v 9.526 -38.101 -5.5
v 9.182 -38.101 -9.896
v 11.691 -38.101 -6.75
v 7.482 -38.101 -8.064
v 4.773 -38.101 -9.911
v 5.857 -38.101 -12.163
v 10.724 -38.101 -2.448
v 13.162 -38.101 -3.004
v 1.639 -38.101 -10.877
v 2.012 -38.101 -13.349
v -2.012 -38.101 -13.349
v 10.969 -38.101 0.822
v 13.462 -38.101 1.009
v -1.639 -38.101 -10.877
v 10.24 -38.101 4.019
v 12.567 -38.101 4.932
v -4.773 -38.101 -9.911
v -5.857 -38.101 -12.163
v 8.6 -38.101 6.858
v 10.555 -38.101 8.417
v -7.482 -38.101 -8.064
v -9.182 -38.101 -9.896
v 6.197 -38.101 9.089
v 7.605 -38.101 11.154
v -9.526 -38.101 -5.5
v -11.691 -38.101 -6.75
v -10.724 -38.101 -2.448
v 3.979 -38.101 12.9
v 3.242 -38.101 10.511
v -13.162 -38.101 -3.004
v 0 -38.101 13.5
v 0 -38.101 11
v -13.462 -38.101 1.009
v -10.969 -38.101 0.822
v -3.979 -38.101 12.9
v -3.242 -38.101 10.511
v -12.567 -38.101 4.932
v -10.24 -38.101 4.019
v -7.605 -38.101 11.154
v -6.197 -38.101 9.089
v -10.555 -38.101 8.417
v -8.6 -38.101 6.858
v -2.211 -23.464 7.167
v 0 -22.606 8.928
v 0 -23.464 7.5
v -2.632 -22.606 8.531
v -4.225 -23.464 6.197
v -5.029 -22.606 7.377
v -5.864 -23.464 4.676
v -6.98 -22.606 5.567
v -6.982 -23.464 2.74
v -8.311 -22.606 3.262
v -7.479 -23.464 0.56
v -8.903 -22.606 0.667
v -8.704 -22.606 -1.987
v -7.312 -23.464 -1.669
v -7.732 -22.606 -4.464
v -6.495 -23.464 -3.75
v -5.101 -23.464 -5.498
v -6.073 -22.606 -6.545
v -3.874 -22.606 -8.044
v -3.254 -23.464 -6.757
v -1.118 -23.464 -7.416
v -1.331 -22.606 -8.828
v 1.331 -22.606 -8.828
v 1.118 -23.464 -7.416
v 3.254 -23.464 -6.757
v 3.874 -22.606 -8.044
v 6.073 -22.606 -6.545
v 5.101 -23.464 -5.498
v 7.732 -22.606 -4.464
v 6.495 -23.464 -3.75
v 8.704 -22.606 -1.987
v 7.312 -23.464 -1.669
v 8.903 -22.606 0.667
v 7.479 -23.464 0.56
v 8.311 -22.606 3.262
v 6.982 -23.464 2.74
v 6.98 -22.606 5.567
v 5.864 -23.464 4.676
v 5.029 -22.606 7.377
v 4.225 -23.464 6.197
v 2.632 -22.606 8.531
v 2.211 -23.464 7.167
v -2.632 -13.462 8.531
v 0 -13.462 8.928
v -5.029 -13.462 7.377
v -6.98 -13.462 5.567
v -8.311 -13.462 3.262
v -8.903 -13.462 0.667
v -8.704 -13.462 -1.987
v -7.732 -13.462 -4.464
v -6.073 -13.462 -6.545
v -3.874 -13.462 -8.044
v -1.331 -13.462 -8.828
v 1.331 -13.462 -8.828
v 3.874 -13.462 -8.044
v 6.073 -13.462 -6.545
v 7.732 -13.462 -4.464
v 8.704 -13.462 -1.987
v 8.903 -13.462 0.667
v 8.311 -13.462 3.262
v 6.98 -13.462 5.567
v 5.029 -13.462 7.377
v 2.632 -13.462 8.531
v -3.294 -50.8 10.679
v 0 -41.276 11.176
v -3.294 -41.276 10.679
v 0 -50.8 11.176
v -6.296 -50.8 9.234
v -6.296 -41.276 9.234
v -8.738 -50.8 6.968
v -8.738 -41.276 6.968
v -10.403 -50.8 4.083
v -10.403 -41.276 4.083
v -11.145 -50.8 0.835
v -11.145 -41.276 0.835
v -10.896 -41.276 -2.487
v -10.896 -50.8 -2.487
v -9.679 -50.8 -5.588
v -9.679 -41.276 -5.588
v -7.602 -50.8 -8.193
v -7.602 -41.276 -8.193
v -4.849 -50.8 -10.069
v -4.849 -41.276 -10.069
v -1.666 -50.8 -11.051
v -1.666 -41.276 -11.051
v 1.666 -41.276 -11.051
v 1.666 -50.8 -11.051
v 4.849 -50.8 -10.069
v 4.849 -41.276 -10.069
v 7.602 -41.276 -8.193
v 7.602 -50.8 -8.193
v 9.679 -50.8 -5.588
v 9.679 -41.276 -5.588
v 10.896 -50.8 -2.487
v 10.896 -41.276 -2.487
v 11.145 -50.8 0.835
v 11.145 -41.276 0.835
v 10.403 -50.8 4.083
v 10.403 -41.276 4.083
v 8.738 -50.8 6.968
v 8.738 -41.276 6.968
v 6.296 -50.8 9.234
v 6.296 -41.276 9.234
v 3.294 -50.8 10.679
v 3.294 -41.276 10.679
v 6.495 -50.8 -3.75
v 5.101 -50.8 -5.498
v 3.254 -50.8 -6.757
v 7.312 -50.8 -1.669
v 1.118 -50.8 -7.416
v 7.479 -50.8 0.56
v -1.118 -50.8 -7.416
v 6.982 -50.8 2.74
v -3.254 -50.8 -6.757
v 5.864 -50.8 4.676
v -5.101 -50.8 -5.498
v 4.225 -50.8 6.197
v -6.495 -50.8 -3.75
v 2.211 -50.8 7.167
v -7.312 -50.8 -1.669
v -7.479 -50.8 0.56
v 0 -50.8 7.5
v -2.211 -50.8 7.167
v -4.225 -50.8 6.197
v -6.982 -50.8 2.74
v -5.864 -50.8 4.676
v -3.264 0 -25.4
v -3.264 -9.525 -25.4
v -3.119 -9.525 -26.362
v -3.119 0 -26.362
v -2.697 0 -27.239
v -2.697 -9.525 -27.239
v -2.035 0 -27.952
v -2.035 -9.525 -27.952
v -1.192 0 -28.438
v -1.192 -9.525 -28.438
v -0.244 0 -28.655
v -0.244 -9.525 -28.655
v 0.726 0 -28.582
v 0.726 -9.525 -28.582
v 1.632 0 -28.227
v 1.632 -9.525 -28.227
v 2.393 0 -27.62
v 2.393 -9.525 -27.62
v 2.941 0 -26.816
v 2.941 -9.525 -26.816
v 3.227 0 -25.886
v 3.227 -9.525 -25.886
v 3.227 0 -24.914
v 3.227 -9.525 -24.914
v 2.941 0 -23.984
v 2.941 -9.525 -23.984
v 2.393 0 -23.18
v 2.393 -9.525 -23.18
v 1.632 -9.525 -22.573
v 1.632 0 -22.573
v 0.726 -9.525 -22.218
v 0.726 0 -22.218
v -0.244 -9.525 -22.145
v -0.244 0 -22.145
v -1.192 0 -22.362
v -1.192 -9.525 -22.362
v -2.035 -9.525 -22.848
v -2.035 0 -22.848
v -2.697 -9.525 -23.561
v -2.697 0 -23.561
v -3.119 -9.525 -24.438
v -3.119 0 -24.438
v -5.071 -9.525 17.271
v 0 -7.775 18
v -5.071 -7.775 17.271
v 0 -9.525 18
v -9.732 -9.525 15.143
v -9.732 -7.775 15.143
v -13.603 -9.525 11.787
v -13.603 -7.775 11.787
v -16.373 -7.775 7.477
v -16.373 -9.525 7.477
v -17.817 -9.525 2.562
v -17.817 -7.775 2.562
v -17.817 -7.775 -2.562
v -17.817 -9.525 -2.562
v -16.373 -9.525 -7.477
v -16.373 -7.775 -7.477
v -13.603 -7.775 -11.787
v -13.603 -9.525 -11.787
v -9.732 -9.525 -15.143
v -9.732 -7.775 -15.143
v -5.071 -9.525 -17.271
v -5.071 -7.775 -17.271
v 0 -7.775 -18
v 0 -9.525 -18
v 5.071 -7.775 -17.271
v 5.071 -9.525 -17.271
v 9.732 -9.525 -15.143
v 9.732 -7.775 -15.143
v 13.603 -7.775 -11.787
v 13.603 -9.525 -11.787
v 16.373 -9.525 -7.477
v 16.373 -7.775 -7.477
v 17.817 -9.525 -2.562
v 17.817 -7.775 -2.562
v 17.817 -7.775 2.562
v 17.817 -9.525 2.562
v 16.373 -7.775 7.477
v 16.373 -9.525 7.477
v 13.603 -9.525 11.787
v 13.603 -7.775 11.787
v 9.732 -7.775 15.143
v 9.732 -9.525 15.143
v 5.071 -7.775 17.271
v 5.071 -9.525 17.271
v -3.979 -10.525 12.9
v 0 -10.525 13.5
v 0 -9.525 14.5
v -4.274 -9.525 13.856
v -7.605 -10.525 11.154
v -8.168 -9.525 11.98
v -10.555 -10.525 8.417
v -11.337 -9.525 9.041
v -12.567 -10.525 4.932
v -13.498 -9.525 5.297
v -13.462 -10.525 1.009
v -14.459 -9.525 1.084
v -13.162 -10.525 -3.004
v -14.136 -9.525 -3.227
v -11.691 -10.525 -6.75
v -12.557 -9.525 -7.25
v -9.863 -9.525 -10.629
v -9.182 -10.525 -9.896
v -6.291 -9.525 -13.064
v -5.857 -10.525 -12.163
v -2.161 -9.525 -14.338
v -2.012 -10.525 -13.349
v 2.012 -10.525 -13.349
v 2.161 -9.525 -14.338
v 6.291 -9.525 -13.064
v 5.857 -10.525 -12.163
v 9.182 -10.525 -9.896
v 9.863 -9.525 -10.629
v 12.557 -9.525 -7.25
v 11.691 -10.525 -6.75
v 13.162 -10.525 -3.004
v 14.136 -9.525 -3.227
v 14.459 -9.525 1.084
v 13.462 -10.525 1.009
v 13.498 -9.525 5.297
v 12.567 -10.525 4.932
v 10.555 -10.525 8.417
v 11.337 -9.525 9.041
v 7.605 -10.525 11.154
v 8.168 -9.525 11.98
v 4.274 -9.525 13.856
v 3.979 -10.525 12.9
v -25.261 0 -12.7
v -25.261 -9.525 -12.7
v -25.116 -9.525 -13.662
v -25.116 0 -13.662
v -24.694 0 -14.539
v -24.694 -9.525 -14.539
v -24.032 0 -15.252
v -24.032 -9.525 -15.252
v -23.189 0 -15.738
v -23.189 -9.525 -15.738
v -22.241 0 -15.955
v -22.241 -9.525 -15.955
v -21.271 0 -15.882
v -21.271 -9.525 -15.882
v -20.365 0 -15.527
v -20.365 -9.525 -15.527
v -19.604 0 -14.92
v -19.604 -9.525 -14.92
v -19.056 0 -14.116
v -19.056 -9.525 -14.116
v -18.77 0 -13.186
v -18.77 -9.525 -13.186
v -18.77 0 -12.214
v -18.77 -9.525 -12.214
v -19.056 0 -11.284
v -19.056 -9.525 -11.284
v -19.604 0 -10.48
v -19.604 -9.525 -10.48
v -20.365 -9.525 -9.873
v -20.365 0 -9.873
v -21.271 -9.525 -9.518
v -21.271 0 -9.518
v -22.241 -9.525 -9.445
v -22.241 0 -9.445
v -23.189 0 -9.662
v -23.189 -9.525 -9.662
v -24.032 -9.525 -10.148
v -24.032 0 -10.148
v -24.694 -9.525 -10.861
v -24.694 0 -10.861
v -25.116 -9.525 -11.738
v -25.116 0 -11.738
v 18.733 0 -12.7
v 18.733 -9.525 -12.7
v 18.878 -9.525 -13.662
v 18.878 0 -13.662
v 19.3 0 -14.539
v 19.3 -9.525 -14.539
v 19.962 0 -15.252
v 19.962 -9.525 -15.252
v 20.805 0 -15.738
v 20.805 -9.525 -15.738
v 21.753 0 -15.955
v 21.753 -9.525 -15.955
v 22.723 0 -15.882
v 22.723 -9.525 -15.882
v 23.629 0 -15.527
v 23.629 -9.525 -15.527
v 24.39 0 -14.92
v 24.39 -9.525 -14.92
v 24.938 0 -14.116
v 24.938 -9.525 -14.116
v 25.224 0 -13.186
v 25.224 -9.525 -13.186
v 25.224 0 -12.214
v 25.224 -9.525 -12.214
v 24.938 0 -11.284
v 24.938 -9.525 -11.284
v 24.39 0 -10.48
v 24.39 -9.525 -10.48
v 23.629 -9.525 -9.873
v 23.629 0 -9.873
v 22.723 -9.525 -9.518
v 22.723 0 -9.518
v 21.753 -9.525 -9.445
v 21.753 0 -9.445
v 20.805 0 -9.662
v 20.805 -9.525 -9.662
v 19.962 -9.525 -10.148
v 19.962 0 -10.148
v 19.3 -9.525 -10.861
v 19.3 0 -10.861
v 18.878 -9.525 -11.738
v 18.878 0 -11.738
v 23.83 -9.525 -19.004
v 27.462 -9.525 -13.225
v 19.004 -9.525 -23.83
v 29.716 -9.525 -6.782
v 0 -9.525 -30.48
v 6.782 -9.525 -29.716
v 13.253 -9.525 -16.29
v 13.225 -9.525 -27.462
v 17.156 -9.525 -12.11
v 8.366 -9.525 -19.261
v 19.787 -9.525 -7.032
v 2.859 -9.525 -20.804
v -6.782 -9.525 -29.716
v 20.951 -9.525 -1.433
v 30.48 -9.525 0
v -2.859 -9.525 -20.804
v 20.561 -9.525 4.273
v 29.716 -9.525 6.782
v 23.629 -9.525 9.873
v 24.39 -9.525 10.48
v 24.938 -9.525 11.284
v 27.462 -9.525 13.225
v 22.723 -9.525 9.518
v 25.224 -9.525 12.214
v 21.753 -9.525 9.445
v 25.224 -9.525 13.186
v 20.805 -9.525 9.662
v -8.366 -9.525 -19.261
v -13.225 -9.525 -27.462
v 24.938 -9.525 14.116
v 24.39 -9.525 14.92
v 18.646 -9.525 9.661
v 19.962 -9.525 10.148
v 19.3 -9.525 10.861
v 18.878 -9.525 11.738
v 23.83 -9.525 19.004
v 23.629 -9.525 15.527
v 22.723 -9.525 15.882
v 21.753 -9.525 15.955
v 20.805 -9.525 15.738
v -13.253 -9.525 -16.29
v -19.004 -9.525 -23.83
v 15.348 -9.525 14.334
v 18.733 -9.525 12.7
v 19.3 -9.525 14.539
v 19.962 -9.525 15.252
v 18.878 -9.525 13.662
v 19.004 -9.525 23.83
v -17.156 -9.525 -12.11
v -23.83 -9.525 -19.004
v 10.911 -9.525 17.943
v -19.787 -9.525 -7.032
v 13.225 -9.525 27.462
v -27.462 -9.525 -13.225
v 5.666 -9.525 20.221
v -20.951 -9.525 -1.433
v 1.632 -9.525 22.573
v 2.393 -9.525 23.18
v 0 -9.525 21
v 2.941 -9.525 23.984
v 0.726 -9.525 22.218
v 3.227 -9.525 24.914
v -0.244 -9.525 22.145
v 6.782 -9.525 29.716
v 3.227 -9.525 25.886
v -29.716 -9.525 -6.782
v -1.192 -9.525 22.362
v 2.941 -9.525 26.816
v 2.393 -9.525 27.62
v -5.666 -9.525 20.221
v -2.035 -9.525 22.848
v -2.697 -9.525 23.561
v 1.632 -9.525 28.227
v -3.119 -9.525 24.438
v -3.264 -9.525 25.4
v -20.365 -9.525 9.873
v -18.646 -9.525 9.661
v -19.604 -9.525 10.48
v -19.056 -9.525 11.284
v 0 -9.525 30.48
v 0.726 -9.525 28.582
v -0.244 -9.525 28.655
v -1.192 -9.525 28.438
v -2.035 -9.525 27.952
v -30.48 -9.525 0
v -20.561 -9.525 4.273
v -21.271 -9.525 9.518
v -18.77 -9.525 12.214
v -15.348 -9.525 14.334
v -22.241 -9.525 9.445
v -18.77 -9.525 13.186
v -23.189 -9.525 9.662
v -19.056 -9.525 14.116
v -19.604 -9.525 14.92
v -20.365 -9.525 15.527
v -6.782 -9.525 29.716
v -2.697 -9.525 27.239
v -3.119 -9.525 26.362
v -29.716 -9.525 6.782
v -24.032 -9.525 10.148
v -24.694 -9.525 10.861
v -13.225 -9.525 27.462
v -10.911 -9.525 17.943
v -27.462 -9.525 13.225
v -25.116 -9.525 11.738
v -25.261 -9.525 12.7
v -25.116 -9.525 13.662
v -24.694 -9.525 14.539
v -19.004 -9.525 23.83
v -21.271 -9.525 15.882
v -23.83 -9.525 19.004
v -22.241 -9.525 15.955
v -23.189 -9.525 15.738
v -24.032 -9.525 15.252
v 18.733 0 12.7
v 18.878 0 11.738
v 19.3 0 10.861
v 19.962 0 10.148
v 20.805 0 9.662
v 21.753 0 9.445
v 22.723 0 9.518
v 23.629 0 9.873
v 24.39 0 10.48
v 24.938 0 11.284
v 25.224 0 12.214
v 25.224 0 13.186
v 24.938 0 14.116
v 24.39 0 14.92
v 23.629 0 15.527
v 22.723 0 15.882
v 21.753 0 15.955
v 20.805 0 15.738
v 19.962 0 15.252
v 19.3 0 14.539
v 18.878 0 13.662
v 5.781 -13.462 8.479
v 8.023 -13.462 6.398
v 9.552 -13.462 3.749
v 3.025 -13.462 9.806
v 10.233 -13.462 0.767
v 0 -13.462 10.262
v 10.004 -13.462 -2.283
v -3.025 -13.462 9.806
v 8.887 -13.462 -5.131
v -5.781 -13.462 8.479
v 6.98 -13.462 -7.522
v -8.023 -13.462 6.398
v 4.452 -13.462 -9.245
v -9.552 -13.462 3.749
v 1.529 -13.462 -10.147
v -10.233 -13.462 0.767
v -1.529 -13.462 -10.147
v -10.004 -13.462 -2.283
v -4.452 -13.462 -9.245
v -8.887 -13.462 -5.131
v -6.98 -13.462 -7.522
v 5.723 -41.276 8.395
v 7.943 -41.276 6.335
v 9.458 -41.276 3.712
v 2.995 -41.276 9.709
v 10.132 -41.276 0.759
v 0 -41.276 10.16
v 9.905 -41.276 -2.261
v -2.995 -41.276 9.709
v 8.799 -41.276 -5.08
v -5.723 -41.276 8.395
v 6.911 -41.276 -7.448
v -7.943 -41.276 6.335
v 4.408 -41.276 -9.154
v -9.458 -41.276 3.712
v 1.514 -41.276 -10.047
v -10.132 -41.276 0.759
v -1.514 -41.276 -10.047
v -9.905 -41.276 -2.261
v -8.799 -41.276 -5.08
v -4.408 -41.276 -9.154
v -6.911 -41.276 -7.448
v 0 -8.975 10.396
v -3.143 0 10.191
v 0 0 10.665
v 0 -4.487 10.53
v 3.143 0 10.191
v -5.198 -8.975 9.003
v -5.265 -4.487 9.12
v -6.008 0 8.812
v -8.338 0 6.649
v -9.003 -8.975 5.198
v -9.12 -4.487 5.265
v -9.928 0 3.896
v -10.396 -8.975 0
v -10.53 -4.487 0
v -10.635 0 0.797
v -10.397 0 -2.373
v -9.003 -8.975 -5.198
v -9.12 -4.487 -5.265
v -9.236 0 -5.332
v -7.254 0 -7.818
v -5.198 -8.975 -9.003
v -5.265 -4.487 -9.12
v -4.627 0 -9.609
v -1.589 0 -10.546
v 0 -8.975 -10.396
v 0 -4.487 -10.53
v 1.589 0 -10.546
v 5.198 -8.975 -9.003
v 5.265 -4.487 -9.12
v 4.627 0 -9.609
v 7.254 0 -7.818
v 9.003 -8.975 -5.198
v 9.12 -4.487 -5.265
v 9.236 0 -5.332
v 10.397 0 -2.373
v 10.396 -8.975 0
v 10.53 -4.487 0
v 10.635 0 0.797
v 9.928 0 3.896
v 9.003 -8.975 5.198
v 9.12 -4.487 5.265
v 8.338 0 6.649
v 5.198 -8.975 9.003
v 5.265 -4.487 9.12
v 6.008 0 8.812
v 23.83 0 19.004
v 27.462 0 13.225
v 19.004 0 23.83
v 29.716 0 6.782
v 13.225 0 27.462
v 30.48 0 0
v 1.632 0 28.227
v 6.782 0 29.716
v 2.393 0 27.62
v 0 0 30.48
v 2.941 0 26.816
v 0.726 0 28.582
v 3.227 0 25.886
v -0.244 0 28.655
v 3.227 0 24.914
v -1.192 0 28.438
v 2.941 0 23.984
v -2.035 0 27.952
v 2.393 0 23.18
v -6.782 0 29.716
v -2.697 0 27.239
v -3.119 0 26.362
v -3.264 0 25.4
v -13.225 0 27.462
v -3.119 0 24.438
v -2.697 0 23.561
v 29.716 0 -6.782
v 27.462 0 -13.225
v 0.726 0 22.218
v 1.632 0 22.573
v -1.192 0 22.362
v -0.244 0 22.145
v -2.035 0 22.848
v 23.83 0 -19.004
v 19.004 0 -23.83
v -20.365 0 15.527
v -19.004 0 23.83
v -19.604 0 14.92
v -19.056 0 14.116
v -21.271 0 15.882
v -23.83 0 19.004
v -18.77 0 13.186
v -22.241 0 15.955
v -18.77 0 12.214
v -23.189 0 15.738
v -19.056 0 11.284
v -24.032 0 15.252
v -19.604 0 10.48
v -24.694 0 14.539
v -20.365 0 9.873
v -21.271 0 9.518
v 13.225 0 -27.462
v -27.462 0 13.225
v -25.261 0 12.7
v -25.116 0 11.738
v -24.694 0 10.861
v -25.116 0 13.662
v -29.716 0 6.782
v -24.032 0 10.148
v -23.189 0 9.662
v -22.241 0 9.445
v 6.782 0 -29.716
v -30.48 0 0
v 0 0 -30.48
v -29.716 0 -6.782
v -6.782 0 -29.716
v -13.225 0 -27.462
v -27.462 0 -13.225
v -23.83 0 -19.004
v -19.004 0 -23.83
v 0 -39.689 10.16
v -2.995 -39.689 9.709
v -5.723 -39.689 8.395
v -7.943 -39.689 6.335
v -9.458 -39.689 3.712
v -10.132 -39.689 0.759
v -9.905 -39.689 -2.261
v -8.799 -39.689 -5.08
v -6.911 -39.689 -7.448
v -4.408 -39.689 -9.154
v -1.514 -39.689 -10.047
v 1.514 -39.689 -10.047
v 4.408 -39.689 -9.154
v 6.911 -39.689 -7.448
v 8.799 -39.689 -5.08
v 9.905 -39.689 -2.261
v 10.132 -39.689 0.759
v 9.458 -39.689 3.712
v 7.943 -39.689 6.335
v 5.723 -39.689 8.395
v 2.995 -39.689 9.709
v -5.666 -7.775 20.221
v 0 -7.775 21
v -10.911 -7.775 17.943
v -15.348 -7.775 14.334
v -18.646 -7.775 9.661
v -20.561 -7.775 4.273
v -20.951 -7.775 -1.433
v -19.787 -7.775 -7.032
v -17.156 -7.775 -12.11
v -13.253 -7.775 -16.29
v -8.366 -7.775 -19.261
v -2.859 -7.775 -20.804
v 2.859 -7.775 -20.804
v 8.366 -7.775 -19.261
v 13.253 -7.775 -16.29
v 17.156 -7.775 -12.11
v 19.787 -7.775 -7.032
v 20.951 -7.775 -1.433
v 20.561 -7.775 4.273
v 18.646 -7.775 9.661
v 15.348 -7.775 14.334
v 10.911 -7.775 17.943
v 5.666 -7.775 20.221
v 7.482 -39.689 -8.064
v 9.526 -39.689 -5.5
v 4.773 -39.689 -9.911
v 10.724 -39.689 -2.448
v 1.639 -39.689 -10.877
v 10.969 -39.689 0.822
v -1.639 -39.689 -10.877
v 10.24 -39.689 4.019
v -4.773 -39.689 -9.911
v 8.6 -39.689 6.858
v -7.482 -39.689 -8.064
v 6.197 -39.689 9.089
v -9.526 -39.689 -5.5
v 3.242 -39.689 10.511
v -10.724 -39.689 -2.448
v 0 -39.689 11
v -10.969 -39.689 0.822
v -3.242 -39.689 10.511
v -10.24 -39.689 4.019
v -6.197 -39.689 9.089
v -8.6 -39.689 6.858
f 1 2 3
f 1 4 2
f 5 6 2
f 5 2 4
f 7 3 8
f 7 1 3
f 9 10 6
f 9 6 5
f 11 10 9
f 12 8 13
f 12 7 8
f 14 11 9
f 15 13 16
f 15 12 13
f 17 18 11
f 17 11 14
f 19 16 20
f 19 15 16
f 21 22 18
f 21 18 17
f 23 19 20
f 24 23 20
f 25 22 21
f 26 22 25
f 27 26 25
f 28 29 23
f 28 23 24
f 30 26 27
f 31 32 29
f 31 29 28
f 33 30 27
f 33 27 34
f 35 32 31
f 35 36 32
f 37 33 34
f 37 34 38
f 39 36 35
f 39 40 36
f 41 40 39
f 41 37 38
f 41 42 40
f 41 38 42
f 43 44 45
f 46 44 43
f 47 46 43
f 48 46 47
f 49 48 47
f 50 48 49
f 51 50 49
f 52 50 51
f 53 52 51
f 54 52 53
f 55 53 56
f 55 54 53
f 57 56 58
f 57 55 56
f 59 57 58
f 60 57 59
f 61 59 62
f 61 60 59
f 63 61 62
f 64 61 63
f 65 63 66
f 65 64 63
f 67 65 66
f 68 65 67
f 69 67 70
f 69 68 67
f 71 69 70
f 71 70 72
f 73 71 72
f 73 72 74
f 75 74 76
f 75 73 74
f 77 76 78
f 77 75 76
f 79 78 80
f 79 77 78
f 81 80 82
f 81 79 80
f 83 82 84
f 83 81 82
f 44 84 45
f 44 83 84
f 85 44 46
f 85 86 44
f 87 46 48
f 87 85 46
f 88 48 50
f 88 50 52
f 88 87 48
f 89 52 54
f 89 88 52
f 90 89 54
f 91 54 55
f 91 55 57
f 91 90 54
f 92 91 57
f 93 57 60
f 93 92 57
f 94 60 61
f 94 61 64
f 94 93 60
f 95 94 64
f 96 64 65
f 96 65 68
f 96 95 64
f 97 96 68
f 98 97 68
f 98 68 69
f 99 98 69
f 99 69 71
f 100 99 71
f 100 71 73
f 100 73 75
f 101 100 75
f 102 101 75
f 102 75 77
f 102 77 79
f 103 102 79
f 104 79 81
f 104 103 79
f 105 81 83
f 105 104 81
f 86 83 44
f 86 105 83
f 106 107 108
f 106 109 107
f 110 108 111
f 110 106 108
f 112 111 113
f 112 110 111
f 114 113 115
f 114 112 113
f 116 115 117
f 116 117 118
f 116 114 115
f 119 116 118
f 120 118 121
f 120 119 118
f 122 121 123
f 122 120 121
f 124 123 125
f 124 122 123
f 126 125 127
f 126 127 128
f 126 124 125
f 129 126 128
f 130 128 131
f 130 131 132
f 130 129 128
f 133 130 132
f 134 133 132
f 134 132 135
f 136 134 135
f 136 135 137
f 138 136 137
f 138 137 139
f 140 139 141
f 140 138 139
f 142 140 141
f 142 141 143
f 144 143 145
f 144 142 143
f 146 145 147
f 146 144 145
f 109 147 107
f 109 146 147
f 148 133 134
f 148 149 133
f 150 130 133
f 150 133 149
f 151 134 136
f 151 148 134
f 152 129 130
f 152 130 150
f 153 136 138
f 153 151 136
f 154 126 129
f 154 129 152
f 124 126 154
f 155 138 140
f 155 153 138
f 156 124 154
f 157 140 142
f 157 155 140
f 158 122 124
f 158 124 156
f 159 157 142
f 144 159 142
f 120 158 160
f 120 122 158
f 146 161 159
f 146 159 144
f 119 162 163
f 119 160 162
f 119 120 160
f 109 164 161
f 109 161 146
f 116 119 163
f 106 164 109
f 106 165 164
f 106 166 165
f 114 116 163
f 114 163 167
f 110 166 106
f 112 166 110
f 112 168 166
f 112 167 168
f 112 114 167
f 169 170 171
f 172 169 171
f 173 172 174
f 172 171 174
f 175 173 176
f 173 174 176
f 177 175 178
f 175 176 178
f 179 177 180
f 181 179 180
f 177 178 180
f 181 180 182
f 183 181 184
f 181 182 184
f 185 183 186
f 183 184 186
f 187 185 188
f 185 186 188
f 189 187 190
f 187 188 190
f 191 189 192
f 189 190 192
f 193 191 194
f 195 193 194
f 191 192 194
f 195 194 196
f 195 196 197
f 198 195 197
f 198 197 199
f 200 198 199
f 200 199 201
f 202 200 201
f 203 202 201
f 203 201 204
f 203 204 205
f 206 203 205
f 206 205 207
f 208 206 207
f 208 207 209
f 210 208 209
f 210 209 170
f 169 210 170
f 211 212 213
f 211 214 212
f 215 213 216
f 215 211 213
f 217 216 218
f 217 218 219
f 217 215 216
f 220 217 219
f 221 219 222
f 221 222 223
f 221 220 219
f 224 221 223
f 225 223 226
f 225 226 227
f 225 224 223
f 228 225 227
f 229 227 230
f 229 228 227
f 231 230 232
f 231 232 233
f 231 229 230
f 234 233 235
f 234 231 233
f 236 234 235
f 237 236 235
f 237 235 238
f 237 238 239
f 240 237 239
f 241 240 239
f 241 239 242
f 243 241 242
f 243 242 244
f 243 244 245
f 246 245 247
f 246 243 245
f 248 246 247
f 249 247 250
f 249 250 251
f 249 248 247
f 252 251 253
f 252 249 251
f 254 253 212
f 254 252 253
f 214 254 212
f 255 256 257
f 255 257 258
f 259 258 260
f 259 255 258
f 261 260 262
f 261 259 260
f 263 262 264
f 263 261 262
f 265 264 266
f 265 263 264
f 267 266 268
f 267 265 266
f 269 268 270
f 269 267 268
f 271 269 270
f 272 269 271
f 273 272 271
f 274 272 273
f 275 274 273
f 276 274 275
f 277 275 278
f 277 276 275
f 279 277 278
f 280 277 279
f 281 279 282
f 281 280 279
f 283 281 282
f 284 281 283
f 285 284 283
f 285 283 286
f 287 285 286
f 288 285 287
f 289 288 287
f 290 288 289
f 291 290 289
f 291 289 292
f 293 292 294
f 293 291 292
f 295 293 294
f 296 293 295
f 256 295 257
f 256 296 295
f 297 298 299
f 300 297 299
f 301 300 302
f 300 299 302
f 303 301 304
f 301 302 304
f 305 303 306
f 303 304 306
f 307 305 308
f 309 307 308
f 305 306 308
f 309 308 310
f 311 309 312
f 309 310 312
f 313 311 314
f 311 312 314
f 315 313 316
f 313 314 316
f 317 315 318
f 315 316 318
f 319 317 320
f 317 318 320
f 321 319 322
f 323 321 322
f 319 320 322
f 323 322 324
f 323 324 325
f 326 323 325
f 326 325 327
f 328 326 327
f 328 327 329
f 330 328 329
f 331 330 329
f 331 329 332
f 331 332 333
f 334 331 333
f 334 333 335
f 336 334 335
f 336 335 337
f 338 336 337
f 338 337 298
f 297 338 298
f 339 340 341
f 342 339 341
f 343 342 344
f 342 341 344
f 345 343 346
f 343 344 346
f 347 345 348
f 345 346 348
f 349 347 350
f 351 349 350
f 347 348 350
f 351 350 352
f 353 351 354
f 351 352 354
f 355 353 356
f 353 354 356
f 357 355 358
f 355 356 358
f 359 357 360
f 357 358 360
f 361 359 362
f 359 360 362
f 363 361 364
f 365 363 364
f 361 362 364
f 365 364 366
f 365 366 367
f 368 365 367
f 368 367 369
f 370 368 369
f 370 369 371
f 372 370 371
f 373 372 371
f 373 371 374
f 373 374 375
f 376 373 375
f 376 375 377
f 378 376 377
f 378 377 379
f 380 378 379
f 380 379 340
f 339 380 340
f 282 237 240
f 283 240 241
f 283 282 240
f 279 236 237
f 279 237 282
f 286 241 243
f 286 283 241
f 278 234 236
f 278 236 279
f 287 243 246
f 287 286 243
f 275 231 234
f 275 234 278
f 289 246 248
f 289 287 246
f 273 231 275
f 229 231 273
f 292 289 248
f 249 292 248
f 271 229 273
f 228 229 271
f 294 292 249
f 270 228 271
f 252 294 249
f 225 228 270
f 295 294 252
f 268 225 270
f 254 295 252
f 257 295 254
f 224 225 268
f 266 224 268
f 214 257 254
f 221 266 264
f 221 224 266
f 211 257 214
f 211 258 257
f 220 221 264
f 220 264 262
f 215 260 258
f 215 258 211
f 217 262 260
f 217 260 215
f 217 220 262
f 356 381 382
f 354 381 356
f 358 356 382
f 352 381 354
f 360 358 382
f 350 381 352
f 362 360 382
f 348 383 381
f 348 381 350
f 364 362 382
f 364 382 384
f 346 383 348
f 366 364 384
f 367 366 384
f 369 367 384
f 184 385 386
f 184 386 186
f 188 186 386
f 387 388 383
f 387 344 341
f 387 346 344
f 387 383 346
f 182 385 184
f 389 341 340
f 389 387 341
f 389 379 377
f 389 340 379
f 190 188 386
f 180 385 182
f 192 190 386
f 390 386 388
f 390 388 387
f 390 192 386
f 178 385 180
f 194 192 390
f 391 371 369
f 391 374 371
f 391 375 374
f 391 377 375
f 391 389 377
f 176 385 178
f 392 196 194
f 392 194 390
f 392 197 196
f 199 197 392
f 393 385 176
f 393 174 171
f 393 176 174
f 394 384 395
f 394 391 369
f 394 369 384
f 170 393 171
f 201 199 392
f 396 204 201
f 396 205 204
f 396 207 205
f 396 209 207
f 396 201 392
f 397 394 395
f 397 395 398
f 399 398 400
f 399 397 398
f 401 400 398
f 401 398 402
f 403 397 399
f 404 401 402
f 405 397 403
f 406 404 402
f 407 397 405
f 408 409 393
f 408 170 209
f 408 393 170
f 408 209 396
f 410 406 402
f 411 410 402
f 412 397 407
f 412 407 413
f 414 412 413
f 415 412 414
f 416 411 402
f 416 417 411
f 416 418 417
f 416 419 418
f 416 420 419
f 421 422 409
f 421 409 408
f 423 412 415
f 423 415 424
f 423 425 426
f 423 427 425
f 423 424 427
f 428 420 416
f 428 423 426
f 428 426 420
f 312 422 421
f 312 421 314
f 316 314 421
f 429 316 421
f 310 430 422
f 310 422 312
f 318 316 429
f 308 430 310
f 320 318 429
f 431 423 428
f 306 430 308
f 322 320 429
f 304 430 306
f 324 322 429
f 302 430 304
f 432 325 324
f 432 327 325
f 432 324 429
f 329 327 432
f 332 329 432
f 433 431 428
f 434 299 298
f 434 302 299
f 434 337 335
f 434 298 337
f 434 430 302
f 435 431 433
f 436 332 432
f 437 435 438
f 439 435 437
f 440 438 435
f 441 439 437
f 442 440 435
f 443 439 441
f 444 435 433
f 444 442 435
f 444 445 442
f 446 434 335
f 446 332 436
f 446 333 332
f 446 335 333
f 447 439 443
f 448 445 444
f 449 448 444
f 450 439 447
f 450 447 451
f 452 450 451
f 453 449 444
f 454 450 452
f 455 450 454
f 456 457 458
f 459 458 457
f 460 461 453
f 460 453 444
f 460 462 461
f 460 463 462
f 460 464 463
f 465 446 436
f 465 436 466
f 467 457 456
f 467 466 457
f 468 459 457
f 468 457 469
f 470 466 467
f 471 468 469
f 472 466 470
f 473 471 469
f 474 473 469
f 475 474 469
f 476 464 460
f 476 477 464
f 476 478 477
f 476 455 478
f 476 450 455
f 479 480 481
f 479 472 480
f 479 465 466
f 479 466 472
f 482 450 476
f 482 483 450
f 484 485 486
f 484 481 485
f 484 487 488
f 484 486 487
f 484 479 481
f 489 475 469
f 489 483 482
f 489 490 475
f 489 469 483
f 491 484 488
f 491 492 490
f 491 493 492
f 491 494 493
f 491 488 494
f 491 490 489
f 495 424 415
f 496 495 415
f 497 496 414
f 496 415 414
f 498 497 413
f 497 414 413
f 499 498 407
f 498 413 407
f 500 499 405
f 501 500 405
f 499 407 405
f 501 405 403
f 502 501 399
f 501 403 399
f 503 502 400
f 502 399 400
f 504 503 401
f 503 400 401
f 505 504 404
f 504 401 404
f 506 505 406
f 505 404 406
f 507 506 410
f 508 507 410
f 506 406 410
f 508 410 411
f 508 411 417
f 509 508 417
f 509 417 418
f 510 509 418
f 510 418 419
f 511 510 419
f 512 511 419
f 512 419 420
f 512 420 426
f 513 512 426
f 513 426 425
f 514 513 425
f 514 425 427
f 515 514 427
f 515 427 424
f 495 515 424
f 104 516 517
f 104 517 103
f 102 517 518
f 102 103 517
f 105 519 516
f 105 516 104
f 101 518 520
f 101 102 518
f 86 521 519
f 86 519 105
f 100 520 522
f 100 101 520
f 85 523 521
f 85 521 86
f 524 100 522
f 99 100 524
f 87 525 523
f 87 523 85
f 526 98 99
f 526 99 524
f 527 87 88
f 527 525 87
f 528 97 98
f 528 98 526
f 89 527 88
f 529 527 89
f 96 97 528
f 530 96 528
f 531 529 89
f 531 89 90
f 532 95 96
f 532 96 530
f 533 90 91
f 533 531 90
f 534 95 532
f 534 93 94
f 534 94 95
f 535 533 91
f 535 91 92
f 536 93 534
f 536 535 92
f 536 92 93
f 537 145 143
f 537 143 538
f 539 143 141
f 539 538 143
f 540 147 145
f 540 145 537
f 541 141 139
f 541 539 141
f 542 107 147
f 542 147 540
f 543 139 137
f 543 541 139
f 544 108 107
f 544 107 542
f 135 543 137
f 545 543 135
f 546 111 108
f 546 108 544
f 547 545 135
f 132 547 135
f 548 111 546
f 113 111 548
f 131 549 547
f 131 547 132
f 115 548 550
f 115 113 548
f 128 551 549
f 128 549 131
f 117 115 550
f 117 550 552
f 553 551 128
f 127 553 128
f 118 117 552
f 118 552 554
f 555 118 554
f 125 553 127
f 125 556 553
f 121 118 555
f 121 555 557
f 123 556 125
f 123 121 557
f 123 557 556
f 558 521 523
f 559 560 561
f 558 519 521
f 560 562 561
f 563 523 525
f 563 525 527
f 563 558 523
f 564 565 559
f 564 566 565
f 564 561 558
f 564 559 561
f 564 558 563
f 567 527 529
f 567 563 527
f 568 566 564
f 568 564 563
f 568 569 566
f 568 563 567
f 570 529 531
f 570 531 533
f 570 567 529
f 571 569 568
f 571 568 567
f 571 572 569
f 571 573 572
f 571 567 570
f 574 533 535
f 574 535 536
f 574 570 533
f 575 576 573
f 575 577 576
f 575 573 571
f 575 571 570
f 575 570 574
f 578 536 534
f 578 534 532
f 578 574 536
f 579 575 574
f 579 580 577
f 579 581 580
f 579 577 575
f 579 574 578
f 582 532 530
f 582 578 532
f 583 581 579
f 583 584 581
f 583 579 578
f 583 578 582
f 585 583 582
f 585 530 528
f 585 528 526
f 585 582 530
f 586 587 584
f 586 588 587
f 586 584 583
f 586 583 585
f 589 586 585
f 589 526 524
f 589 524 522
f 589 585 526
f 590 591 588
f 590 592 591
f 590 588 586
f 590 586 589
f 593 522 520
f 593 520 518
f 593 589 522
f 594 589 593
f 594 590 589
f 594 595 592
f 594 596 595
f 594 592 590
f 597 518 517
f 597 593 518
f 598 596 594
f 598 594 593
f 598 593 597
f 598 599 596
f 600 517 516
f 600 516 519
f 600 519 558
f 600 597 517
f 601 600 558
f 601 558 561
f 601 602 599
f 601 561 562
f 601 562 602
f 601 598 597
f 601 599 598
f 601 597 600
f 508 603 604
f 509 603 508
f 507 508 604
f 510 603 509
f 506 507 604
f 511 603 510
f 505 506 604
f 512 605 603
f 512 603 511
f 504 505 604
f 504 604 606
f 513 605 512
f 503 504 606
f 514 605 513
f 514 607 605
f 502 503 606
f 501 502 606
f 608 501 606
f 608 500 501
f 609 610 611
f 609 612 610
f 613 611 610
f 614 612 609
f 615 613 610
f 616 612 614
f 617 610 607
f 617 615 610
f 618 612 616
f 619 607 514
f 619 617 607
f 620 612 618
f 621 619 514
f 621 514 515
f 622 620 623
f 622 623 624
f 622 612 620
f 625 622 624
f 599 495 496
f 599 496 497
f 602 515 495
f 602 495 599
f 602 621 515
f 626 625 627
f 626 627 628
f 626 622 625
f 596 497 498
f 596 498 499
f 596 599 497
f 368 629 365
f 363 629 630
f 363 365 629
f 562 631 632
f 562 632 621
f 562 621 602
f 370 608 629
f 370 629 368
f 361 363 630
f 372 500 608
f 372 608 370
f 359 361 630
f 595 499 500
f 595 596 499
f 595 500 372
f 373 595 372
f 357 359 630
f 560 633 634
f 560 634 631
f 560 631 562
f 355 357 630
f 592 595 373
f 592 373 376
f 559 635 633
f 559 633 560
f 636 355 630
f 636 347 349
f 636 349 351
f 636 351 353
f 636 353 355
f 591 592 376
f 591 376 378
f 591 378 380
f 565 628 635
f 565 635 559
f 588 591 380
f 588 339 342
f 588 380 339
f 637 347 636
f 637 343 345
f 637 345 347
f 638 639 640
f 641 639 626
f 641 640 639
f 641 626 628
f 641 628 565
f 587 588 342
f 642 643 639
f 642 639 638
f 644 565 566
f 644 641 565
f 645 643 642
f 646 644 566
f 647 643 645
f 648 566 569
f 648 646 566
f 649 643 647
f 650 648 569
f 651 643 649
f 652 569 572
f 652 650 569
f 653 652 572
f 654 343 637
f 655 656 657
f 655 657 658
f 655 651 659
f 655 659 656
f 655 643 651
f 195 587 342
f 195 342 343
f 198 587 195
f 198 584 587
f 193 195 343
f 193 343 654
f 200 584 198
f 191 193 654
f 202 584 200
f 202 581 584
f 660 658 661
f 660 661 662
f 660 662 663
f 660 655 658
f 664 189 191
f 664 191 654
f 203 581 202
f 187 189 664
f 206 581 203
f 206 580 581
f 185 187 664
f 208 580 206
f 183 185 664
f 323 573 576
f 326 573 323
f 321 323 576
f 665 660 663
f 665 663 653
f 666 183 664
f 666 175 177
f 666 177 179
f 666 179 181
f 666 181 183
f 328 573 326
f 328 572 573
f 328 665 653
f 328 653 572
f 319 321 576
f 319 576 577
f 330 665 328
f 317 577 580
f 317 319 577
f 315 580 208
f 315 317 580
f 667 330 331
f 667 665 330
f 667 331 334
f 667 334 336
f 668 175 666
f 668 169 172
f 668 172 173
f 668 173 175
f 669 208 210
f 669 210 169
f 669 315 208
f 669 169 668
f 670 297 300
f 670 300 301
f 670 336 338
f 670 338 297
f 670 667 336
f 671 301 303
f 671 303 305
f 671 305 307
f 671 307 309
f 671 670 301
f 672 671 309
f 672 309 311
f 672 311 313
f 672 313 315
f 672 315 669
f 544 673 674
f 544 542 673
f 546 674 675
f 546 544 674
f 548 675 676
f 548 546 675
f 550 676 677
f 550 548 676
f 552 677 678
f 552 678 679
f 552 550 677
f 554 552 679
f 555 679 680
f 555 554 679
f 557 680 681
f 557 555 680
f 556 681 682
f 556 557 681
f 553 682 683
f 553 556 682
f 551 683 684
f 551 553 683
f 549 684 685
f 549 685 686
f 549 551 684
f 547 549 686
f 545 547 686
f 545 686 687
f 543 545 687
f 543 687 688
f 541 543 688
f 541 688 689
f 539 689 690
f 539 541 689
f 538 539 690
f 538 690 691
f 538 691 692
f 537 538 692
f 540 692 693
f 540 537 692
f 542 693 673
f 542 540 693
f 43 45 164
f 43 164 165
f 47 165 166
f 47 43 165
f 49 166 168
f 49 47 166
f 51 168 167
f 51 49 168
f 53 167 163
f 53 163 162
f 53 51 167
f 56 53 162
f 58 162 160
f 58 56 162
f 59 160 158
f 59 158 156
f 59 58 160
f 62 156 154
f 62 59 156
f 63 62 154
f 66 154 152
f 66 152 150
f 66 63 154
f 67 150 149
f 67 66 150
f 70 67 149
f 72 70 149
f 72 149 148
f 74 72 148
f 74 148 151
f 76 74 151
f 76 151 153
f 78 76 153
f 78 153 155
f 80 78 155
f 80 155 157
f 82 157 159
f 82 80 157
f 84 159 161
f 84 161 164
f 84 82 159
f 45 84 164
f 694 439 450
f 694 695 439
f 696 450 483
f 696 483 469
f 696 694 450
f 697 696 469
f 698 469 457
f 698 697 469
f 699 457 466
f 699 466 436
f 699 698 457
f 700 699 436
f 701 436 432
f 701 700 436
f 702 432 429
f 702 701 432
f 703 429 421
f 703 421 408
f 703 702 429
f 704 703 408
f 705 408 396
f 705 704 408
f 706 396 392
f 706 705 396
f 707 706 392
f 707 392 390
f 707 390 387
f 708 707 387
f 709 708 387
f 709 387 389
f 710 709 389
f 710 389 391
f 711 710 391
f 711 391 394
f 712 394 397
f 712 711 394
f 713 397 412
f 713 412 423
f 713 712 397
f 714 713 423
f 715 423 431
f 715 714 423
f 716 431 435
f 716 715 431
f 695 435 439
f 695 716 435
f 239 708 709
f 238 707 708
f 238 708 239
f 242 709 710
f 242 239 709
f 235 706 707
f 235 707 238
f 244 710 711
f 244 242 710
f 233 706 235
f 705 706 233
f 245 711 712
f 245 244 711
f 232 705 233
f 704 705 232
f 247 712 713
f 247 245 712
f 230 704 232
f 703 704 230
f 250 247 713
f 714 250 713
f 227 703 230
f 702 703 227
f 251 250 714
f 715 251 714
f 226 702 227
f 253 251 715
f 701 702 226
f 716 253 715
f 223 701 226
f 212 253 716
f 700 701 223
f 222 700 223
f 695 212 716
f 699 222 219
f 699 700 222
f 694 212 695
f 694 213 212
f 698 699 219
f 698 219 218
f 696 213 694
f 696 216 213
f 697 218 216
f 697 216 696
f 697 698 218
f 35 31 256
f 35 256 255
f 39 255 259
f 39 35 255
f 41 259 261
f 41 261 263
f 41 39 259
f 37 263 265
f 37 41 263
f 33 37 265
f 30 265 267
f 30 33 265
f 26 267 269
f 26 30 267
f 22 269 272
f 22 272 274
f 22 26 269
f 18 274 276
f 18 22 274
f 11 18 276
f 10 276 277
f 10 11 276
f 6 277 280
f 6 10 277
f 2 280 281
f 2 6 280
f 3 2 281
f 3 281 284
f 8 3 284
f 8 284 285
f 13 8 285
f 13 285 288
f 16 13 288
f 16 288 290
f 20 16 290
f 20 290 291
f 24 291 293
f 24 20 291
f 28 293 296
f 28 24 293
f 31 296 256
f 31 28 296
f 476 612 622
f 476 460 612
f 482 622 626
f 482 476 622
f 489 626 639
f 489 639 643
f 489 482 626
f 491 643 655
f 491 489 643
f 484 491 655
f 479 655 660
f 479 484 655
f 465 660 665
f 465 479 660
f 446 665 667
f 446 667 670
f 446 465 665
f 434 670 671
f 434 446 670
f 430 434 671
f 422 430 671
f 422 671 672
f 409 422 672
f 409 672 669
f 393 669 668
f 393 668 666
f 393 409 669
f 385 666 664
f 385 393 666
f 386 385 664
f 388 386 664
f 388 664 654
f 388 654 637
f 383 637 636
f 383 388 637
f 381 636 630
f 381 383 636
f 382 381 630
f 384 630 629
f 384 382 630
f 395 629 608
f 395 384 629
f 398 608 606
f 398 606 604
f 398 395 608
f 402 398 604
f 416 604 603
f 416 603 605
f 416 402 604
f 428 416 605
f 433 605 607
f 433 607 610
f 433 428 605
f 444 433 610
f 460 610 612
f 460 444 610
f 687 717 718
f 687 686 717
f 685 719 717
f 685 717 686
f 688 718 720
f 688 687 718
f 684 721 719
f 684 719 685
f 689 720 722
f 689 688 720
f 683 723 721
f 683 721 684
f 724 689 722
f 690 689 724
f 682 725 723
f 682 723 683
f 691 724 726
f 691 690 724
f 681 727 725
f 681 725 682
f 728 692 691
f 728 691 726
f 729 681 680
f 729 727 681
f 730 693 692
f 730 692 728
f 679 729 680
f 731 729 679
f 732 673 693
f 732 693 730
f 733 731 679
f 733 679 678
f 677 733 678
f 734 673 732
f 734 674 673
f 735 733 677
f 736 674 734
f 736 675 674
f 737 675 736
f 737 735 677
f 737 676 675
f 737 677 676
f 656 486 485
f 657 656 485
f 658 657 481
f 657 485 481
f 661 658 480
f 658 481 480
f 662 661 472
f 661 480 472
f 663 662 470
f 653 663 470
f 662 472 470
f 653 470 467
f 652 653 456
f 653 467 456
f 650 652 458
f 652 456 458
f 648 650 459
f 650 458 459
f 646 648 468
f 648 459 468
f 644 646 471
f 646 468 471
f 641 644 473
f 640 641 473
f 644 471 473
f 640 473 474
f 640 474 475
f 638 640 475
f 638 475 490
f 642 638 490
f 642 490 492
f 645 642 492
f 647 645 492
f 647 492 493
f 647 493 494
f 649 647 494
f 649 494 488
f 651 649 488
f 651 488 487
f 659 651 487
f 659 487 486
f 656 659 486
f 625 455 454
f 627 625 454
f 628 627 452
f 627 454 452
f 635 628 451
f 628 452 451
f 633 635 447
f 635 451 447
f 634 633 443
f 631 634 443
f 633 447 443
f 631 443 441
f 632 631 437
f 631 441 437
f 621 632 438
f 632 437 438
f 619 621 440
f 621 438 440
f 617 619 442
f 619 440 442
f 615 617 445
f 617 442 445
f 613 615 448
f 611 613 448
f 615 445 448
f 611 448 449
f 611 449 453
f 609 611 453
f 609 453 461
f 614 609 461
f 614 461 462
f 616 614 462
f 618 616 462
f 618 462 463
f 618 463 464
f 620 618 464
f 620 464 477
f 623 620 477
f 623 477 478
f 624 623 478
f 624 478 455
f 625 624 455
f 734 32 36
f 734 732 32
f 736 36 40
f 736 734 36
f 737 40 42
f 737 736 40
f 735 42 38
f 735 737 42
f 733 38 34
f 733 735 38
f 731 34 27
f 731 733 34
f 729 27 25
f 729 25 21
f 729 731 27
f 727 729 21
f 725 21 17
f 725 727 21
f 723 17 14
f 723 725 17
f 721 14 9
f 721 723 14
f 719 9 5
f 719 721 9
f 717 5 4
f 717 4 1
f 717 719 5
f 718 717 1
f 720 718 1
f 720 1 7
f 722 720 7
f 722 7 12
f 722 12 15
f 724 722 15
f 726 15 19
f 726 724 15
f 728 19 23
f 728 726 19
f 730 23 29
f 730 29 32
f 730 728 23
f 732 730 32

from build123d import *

# Parameters (mm, degrees)
F_1_4_CLEARANCE_HOLE1_D     = 6.5278
F_1_4_CLEARANCE_HOLE1_DEPTH = 22.606
F_1_4_CLEARANCE_HOLE1_TIP   = 1.961148974
CHAMFER1_SIZE               = 1


with BuildPart() as part:
    # Sketch1 → Revolve1 (revolve)
    with BuildSketch(Plane.XY, mode=Mode.PRIVATE) as revolve1_sk:
        Polygon((-7.5, 0), (-30.48, 0), (-30.48, -9.525), (-21, -9.525), (-21, -7.775), (-18, -7.775), (-18, -9.525), (-13.5, -9.525), (-13.5, -38.101219586), (-11, -38.101219586), (-11, -39.688719586), (-10.16, -39.688719586), (-10.16, -41.276219586), (-11.176, -41.276219586), (-11.176, -50.8), (-7.5, -50.8), align=None)
    revolve(revolve1_sk.sketch.rotate(Axis((0, 0, 0), (0, -1, 0)), 270), axis=Axis((0, 0, 0), (0, -1, 0)))

    # Sketch3 → 1/2 NPT Tapped Hole1 (revolve, cut)
    with BuildSketch(Plane(origin=(0, 0, 0), x_dir=(0, 0, 1), z_dir=(1, 0, 0))):
        Polygon((0, 0), (0, 27.970543693), (8.9281, 22.606), (8.9281, 13.462), (10.261665792, 13.462), (10.6647361, 0), align=None)
    revolve(axis=Axis((0, 6.35, 0), (0, -1, 0)), mode=Mode.SUBTRACT)

    # 1/4 Clearance Hole1
    with Locations(Plane(origin=(0, 0, 0), x_dir=(1, 0, 0), z_dir=(0, 1, 0))):
        with Locations((21.997045256, 12.7), (0, 25.4), (-21.997045256, 12.7), (-21.997045256, -12.7), (0, -25.4), (21.997045256, -12.7)):
            Hole(F_1_4_CLEARANCE_HOLE1_D / 2, depth=F_1_4_CLEARANCE_HOLE1_DEPTH)
            with Locations((0, 0, -(F_1_4_CLEARANCE_HOLE1_DEPTH + F_1_4_CLEARANCE_HOLE1_TIP / 2))):  # 118° drill point
                Cone(0, F_1_4_CLEARANCE_HOLE1_D / 2, F_1_4_CLEARANCE_HOLE1_TIP, mode=Mode.SUBTRACT)

    # Chamfer1
    chamfer1_edges = [part.edges().sort_by_distance(p)[0] for p in [
        (0, -9.525, -13.5),
    ]]
    chamfer(chamfer1_edges, length=CHAMFER1_SIZE)


solid = part.part
